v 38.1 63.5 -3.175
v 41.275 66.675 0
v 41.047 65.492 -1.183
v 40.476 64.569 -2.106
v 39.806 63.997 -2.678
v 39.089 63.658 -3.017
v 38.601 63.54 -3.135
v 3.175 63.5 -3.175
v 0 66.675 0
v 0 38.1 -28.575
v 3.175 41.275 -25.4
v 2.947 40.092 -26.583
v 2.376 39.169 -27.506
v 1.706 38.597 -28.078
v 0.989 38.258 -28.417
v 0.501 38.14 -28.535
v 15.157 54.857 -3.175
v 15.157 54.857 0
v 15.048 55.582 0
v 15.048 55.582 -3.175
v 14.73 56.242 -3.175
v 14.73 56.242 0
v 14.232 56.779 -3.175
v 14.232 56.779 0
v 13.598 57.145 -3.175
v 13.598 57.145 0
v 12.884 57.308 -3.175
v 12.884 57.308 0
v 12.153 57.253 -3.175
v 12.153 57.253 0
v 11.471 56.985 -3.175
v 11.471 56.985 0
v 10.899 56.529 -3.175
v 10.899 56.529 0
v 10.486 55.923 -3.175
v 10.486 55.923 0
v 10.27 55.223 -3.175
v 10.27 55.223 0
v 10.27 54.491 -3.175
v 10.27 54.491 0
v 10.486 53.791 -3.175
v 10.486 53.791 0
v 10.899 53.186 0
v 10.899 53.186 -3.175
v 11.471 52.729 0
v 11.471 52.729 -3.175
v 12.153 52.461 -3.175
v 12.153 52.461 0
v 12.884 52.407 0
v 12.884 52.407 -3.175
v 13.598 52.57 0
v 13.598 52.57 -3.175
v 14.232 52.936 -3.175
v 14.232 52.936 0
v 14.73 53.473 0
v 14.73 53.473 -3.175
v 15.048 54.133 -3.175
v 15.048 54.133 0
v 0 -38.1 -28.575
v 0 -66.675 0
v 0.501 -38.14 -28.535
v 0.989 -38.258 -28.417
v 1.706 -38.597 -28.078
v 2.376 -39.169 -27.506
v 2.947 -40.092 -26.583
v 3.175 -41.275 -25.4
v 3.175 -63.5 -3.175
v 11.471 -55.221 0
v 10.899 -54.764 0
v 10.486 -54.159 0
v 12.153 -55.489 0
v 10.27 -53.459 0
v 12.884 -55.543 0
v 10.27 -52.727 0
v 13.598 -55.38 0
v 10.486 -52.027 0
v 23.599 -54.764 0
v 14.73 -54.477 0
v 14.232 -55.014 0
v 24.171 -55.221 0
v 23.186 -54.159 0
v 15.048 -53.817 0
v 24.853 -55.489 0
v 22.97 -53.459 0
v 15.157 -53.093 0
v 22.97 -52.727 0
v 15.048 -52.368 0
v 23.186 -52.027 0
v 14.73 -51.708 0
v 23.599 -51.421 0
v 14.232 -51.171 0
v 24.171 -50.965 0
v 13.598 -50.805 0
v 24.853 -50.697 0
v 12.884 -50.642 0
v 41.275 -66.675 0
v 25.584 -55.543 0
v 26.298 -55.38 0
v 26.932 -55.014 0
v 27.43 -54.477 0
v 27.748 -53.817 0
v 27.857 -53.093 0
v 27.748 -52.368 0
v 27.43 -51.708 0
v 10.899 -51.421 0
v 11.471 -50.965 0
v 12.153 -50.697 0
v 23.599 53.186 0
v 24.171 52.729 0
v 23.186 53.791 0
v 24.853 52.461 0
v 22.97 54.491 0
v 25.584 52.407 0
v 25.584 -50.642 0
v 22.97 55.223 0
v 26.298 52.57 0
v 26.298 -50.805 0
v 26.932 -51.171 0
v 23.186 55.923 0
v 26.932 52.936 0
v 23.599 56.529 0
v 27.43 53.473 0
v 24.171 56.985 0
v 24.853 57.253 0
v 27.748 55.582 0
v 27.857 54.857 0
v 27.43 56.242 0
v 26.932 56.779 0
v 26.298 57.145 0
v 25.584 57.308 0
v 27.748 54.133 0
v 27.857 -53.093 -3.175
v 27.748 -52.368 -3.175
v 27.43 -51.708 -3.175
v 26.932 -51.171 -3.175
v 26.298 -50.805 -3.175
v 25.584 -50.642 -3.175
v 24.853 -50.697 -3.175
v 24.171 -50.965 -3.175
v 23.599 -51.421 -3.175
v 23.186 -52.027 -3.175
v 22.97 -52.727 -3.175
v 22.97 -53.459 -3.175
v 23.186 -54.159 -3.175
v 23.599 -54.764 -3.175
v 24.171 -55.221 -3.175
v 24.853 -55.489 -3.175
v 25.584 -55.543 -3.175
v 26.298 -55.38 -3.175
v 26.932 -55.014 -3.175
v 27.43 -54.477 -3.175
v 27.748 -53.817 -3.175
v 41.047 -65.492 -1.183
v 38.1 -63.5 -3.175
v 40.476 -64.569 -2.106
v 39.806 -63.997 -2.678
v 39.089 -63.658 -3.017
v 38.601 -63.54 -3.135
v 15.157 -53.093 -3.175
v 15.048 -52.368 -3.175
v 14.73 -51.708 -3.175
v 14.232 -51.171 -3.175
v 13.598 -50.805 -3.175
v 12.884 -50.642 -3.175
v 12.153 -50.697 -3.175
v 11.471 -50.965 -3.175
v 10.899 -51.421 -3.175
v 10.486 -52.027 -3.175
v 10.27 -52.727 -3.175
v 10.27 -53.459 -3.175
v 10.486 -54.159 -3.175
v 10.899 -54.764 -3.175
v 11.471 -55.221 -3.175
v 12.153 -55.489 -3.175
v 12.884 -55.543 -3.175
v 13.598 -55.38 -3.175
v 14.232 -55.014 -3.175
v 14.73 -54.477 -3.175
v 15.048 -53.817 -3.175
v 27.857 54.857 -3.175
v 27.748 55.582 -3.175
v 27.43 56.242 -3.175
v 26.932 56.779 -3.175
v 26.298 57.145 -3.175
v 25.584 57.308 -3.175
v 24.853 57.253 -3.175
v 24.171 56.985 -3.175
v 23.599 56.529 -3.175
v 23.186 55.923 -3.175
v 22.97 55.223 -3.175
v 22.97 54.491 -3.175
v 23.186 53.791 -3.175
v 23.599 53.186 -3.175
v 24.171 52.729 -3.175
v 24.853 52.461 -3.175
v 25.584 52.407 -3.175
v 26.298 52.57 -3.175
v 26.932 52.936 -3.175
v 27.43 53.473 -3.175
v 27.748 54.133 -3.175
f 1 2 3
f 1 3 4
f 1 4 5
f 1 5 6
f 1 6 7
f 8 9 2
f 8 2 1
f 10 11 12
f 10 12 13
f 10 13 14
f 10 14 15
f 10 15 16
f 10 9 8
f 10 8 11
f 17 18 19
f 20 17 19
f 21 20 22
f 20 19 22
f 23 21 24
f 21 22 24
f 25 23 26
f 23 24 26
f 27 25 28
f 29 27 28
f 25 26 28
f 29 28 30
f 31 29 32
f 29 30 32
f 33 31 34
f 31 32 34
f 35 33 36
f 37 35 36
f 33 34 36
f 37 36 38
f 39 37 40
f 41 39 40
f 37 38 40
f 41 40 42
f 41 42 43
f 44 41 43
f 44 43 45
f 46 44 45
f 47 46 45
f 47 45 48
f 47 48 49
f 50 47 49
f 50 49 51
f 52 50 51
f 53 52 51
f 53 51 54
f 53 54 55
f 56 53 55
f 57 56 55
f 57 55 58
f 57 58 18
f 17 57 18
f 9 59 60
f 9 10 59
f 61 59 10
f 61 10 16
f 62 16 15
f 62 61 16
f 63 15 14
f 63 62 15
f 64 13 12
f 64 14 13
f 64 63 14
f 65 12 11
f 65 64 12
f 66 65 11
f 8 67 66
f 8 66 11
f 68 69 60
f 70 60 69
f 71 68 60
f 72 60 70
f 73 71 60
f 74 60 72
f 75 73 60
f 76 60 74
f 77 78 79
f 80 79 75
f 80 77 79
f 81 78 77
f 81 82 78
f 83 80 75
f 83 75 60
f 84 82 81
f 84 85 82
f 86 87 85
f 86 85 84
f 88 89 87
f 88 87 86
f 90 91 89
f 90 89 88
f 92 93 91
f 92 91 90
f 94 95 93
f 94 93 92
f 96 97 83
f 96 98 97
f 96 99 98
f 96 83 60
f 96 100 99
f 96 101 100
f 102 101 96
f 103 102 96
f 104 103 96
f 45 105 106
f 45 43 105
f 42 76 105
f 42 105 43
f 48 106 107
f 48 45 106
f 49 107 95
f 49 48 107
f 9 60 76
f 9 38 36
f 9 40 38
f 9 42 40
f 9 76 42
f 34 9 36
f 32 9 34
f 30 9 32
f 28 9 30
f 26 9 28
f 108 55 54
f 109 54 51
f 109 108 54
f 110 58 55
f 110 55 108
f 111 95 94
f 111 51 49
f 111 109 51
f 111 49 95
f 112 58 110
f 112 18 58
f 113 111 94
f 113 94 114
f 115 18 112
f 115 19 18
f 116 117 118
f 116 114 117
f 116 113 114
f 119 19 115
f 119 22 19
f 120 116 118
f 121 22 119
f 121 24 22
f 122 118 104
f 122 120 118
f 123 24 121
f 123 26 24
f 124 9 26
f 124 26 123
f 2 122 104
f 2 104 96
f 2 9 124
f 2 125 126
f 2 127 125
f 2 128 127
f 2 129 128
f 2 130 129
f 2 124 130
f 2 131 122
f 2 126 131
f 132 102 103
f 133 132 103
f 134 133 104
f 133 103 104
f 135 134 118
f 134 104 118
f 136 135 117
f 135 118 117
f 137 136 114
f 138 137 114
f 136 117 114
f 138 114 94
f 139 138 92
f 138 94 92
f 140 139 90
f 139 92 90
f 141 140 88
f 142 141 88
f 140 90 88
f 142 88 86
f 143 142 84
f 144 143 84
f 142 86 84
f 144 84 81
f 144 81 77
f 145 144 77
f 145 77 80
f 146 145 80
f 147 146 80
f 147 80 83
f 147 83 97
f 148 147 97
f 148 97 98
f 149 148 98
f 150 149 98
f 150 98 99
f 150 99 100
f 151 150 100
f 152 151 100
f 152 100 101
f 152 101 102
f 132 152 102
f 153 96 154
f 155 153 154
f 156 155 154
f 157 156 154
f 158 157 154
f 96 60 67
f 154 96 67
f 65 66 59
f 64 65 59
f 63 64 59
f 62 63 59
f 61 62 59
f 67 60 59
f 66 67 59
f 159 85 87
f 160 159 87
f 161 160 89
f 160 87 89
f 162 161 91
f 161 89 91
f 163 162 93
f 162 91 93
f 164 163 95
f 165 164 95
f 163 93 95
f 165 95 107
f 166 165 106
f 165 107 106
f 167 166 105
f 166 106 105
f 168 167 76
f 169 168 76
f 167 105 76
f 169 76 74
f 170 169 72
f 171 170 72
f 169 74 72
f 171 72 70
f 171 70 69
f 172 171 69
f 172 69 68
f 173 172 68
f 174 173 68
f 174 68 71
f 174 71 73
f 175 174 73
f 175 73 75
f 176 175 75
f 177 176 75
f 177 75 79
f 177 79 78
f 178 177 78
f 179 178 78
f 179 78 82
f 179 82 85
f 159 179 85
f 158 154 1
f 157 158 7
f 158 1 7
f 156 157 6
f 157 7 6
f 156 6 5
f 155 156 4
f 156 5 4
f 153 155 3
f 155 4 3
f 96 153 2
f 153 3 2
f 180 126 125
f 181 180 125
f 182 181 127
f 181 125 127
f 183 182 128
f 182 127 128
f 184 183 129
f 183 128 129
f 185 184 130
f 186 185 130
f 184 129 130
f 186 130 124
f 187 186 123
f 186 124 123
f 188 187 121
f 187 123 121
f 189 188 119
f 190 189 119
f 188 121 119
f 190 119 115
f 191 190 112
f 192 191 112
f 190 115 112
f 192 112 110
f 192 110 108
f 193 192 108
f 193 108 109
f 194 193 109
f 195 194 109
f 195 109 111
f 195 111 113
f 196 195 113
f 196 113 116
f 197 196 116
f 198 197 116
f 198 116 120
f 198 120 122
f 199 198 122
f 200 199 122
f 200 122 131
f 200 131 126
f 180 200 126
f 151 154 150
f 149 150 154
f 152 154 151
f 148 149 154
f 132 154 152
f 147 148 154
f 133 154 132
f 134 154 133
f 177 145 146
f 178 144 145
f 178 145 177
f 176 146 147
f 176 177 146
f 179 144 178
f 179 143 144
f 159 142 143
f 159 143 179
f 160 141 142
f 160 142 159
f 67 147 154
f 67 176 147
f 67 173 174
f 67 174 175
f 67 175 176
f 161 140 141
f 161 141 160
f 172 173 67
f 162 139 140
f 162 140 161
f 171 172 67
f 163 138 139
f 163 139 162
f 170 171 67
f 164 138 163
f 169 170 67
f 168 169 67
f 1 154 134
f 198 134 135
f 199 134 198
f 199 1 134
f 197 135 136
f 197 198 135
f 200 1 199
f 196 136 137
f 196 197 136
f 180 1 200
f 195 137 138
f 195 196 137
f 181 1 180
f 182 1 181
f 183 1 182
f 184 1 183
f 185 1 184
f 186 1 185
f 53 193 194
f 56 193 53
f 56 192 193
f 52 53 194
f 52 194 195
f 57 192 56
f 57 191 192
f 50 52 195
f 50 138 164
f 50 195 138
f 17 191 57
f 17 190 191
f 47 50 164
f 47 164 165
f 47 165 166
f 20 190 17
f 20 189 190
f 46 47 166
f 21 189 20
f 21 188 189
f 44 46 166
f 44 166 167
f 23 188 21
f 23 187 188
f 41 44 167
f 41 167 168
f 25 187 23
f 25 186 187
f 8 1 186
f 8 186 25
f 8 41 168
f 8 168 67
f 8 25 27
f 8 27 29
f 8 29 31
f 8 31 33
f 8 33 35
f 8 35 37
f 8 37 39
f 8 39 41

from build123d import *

# Parameters (mm, degrees)
BOSS_EXTRUDE1_DEPTH          = 66.675
FILLET1_R                    = 3.175
CUT_EXTRUDE1_DEPTH           = 84.460840368
F_10_0_1935_DIAMETER_HOLE1_D = 4.9149


with BuildPart() as part:
    # Sketch1 → Boss-Extrude1 (new, symmetric)
    with BuildSketch(Plane(origin=(0, 0, 0), x_dir=(1, 0, 0), z_dir=(0, 1, 0))):
        Polygon((0, 28.575), (0, 0), (41.275, 0), (41.275, 3.175), (3.175, 3.175), (3.175, 28.575), align=None)
    extrude(amount=BOSS_EXTRUDE1_DEPTH, both=True)

    # Fillet1
    fillet1_edges = [part.edges().sort_by_distance(p)[0] for p in [
        (41.275, 0, -3.175),
        (3.175, 0, -28.575),
    ]]
    fillet(fillet1_edges, radius=FILLET1_R - 0.0001)  # a hair under: the kernel refuses the full size

    # Sketch4 → Cut-Extrude1 (cut, through all)
    with BuildSketch(Plane.ZY):
        Polygon((0, -66.675), (-28.575, -38.1), (-28.575, -66.675), align=None)
        Polygon((0, 66.675), (-28.575, 38.1), (-28.575, 66.675), align=None)
    extrude(amount=-CUT_EXTRUDE1_DEPTH, mode=Mode.SUBTRACT)

    # #10 (0.1935) Diameter Hole1 (through all)
    with Locations(Plane(origin=(0, 0, -3.175), x_dir=(-1, 0, 0), z_dir=(0, 0, -1))):
        with Locations((-25.4, -53.092781609), (-12.7, -53.092781609), (-12.7, 54.857218391), (-25.4, 54.857218391)):
            Hole(F_10_0_1935_DIAMETER_HOLE1_D / 2)


solid = part.part
